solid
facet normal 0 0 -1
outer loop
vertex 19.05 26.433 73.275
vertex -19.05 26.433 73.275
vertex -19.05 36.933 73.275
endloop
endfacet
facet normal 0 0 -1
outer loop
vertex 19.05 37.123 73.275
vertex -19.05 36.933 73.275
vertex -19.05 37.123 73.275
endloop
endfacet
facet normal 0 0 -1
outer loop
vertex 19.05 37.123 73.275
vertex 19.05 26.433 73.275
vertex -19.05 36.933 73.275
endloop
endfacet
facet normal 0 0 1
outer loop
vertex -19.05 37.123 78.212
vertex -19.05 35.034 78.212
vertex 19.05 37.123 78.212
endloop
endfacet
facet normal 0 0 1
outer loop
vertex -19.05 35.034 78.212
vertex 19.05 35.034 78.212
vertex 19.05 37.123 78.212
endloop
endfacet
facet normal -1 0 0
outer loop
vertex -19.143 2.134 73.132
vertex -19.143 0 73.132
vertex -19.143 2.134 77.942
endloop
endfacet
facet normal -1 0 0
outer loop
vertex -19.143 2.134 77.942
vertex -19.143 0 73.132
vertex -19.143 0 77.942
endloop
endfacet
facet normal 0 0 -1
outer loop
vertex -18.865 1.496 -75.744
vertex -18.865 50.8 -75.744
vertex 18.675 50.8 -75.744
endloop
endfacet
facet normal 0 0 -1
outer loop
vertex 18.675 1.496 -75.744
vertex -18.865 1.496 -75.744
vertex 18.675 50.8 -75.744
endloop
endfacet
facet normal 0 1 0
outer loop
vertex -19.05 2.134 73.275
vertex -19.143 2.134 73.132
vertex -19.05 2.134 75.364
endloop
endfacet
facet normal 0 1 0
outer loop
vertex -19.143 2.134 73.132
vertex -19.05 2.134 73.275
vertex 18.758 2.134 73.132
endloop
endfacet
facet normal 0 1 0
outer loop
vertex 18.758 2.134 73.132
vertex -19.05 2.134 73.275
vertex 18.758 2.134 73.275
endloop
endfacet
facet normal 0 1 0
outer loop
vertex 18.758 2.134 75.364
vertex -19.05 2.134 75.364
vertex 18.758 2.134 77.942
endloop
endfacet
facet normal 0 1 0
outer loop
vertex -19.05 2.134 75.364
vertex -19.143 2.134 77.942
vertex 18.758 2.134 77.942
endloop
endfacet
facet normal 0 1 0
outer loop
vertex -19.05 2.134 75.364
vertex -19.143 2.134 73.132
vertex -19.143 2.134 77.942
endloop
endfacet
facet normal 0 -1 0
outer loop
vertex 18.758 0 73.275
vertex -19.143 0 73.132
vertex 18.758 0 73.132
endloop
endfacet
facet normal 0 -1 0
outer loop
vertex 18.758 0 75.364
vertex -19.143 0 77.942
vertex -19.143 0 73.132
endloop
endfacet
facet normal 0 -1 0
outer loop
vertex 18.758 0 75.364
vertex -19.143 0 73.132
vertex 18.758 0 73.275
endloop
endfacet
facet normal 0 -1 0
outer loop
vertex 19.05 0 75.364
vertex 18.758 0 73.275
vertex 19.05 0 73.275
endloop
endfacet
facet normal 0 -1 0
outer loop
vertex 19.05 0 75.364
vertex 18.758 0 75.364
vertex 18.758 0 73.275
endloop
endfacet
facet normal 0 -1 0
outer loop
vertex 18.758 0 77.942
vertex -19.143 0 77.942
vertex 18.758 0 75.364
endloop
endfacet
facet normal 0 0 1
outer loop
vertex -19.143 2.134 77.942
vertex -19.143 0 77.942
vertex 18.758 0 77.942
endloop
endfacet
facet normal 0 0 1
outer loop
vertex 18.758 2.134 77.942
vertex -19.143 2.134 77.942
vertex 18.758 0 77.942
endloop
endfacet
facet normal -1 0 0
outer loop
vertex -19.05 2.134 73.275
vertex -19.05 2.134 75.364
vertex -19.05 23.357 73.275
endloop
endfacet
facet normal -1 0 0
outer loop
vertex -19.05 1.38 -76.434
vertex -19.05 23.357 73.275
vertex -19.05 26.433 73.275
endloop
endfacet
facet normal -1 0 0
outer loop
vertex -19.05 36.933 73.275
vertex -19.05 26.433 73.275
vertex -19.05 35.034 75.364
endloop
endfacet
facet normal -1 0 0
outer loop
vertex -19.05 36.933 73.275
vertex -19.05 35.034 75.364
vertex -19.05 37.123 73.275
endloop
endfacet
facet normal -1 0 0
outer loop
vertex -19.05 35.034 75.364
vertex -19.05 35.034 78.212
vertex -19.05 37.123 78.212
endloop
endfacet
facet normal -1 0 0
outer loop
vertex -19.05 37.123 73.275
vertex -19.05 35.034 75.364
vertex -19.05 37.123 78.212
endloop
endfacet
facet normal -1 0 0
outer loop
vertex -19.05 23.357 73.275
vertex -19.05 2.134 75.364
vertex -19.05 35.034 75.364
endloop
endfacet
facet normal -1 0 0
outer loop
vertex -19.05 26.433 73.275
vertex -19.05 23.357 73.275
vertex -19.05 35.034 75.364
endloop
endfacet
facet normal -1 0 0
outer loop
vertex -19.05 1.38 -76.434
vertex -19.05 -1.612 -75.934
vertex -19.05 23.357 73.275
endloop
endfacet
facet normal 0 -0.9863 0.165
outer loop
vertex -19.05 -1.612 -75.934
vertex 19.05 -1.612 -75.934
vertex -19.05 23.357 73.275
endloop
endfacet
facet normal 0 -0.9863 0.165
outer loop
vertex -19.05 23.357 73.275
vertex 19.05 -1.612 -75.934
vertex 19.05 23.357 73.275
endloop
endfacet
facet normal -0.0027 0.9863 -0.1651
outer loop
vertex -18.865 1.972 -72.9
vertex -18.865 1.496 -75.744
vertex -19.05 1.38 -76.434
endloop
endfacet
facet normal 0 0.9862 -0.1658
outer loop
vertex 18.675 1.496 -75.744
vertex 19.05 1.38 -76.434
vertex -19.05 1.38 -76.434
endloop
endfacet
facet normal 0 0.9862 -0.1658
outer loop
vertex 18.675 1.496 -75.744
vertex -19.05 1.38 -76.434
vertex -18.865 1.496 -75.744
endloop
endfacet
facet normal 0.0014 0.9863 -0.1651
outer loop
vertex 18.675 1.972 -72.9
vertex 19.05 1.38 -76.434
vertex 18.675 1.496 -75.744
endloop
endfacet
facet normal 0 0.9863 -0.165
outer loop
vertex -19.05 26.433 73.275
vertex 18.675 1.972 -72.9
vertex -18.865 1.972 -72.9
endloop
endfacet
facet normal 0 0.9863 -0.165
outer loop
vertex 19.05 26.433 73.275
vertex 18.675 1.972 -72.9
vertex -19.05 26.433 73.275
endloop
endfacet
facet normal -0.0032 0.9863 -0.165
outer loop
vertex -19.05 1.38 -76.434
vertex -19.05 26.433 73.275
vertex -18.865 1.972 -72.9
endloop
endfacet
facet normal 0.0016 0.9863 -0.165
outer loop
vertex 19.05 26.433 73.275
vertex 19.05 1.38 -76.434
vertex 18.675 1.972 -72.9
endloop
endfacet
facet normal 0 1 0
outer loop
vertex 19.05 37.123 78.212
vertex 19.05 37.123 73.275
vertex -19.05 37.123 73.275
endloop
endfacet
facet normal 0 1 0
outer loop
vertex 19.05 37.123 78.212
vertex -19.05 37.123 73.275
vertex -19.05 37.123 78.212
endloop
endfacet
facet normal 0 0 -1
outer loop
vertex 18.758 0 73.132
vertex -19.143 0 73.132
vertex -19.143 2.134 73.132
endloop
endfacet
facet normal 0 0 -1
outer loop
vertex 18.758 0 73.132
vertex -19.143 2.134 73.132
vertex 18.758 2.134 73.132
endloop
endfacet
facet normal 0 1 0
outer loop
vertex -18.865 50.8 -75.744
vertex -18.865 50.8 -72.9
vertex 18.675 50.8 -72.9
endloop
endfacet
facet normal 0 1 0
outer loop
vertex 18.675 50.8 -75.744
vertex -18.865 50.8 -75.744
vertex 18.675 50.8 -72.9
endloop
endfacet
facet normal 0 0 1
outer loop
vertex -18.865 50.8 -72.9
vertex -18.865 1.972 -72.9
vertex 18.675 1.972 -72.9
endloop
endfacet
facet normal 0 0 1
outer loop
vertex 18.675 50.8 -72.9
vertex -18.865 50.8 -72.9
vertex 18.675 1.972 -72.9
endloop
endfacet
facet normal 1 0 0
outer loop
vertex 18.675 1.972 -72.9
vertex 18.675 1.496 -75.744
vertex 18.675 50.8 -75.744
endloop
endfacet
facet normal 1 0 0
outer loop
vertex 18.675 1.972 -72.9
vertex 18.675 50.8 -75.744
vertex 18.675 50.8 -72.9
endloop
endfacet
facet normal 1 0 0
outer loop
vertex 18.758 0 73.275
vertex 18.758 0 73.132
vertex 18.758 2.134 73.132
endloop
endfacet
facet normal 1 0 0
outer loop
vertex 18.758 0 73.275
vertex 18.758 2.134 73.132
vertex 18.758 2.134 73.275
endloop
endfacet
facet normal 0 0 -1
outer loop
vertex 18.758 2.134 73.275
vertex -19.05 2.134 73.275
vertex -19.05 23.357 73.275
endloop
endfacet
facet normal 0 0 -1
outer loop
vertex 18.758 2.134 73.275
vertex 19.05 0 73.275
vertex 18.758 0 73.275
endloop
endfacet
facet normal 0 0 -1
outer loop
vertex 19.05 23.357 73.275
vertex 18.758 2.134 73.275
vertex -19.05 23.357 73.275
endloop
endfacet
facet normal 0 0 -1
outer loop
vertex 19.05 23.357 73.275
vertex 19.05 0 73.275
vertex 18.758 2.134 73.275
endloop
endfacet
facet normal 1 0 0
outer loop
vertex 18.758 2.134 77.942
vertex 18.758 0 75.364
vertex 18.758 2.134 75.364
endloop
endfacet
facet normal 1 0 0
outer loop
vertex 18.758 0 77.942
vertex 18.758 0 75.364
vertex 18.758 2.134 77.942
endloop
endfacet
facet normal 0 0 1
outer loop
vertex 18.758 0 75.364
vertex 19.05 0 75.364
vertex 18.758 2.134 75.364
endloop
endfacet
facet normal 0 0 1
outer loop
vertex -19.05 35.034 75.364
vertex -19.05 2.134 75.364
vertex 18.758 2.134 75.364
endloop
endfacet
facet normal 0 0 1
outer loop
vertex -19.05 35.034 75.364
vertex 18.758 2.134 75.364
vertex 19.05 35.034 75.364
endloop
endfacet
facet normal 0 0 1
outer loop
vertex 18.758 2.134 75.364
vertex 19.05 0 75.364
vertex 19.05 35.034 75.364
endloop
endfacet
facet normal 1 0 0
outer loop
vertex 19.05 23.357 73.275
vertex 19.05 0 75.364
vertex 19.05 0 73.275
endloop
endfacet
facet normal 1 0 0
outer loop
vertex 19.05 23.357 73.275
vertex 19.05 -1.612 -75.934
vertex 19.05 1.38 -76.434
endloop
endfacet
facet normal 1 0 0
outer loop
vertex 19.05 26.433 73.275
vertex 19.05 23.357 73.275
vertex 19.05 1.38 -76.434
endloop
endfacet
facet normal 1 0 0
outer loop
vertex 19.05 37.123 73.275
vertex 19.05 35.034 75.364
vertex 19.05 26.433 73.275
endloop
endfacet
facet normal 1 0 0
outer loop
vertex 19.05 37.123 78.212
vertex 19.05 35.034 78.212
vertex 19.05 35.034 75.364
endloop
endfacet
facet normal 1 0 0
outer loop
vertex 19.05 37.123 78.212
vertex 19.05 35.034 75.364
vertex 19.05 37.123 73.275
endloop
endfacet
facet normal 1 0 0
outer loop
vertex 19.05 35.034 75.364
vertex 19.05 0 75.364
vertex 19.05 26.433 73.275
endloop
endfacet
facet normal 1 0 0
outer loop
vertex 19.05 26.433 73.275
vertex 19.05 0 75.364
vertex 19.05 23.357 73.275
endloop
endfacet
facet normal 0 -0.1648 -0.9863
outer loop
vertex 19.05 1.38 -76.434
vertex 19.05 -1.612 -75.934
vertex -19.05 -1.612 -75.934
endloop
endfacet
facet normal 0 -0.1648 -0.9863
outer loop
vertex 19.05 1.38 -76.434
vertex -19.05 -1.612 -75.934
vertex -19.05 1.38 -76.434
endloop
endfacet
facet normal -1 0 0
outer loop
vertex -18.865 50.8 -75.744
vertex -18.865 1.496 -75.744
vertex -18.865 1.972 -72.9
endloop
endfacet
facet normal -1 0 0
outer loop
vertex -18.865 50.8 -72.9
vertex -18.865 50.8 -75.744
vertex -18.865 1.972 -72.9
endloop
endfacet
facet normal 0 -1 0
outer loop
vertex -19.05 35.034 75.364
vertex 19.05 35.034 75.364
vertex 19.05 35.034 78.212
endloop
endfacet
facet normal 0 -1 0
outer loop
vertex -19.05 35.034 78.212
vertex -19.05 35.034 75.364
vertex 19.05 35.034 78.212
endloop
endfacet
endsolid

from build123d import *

# Parameters (mm, degrees)
F0_W          = 3.0335542979
F0_H          = 151.8673300743
F1_DEPTH      = 19.05
F1_DEPTH_BACK = 19.05
F2_ANGLE      = 9.5
F3_W          = 37.5402383506
F3_H          = 2.8439536691
F4_DEPTH      = 50.8
F5_W          = 36.9333513081
F5_H          = 2.0887702703
F6_DEPTH      = 19.05
F6_DEPTH_BACK = 19.05
F7_W          = 2.0887777209
F7_H          = 4.9371048808
F8_DEPTH      = 19.05
F8_DEPTH_BACK = 19.05
F9_W          = 37.9011612386
F9_H          = 4.8097893596
F10_DEPTH     = 2.1336


with BuildPart() as f1:
    # F0 (on Right) → F1 (new body, two sides)
    with BuildSketch(Plane.YZ) as f1_sk:
        with Locations((-0.0947989174, 0)):
            Rectangle(F0_W, F0_H)
    extrude(amount=F1_DEPTH)
    extrude(f1_sk.sketch, amount=-F1_DEPTH_BACK)


with BuildPart() as f1_1:
    # F2: moved
    add(f1.part.rotate(Axis((0, -1.6115760664, -75.9336650372), (-1, 0, 0)), F2_ANGLE))

    # F3 (on Front) → F4 (join)
    with BuildSketch(Plane.XZ):
        with Locations((-0.0947974622, -74.3220858276)):
            Rectangle(F3_W, F3_H)
    extrude(amount=-F4_DEPTH)

    # F5 (on Right) → F6 (join, two sides)
    with BuildSketch(Plane.YZ) as f6_sk:
        with Locations((18.4666756541, 74.3191987276)):
            Rectangle(F5_W, F5_H)
    extrude(amount=F6_DEPTH)
    extrude(f6_sk.sketch, amount=-F6_DEPTH_BACK)

    # F7 (on Right) → F8 (join, two sides)
    with BuildSketch(Plane.YZ) as f8_sk:
        with Locations((36.07885167, 75.7433660328)):
            Rectangle(F7_W, F7_H)
    extrude(amount=F8_DEPTH)
    extrude(f8_sk.sketch, amount=-F8_DEPTH_BACK)

    # F9 (on Front) → F10 (join)
    with BuildSketch(Plane.XZ):
        with Locations((-0.1923916861, 75.5367614329)):
            Rectangle(F9_W, F9_H)
    extrude(amount=-F10_DEPTH)


solid = f1_1.part
